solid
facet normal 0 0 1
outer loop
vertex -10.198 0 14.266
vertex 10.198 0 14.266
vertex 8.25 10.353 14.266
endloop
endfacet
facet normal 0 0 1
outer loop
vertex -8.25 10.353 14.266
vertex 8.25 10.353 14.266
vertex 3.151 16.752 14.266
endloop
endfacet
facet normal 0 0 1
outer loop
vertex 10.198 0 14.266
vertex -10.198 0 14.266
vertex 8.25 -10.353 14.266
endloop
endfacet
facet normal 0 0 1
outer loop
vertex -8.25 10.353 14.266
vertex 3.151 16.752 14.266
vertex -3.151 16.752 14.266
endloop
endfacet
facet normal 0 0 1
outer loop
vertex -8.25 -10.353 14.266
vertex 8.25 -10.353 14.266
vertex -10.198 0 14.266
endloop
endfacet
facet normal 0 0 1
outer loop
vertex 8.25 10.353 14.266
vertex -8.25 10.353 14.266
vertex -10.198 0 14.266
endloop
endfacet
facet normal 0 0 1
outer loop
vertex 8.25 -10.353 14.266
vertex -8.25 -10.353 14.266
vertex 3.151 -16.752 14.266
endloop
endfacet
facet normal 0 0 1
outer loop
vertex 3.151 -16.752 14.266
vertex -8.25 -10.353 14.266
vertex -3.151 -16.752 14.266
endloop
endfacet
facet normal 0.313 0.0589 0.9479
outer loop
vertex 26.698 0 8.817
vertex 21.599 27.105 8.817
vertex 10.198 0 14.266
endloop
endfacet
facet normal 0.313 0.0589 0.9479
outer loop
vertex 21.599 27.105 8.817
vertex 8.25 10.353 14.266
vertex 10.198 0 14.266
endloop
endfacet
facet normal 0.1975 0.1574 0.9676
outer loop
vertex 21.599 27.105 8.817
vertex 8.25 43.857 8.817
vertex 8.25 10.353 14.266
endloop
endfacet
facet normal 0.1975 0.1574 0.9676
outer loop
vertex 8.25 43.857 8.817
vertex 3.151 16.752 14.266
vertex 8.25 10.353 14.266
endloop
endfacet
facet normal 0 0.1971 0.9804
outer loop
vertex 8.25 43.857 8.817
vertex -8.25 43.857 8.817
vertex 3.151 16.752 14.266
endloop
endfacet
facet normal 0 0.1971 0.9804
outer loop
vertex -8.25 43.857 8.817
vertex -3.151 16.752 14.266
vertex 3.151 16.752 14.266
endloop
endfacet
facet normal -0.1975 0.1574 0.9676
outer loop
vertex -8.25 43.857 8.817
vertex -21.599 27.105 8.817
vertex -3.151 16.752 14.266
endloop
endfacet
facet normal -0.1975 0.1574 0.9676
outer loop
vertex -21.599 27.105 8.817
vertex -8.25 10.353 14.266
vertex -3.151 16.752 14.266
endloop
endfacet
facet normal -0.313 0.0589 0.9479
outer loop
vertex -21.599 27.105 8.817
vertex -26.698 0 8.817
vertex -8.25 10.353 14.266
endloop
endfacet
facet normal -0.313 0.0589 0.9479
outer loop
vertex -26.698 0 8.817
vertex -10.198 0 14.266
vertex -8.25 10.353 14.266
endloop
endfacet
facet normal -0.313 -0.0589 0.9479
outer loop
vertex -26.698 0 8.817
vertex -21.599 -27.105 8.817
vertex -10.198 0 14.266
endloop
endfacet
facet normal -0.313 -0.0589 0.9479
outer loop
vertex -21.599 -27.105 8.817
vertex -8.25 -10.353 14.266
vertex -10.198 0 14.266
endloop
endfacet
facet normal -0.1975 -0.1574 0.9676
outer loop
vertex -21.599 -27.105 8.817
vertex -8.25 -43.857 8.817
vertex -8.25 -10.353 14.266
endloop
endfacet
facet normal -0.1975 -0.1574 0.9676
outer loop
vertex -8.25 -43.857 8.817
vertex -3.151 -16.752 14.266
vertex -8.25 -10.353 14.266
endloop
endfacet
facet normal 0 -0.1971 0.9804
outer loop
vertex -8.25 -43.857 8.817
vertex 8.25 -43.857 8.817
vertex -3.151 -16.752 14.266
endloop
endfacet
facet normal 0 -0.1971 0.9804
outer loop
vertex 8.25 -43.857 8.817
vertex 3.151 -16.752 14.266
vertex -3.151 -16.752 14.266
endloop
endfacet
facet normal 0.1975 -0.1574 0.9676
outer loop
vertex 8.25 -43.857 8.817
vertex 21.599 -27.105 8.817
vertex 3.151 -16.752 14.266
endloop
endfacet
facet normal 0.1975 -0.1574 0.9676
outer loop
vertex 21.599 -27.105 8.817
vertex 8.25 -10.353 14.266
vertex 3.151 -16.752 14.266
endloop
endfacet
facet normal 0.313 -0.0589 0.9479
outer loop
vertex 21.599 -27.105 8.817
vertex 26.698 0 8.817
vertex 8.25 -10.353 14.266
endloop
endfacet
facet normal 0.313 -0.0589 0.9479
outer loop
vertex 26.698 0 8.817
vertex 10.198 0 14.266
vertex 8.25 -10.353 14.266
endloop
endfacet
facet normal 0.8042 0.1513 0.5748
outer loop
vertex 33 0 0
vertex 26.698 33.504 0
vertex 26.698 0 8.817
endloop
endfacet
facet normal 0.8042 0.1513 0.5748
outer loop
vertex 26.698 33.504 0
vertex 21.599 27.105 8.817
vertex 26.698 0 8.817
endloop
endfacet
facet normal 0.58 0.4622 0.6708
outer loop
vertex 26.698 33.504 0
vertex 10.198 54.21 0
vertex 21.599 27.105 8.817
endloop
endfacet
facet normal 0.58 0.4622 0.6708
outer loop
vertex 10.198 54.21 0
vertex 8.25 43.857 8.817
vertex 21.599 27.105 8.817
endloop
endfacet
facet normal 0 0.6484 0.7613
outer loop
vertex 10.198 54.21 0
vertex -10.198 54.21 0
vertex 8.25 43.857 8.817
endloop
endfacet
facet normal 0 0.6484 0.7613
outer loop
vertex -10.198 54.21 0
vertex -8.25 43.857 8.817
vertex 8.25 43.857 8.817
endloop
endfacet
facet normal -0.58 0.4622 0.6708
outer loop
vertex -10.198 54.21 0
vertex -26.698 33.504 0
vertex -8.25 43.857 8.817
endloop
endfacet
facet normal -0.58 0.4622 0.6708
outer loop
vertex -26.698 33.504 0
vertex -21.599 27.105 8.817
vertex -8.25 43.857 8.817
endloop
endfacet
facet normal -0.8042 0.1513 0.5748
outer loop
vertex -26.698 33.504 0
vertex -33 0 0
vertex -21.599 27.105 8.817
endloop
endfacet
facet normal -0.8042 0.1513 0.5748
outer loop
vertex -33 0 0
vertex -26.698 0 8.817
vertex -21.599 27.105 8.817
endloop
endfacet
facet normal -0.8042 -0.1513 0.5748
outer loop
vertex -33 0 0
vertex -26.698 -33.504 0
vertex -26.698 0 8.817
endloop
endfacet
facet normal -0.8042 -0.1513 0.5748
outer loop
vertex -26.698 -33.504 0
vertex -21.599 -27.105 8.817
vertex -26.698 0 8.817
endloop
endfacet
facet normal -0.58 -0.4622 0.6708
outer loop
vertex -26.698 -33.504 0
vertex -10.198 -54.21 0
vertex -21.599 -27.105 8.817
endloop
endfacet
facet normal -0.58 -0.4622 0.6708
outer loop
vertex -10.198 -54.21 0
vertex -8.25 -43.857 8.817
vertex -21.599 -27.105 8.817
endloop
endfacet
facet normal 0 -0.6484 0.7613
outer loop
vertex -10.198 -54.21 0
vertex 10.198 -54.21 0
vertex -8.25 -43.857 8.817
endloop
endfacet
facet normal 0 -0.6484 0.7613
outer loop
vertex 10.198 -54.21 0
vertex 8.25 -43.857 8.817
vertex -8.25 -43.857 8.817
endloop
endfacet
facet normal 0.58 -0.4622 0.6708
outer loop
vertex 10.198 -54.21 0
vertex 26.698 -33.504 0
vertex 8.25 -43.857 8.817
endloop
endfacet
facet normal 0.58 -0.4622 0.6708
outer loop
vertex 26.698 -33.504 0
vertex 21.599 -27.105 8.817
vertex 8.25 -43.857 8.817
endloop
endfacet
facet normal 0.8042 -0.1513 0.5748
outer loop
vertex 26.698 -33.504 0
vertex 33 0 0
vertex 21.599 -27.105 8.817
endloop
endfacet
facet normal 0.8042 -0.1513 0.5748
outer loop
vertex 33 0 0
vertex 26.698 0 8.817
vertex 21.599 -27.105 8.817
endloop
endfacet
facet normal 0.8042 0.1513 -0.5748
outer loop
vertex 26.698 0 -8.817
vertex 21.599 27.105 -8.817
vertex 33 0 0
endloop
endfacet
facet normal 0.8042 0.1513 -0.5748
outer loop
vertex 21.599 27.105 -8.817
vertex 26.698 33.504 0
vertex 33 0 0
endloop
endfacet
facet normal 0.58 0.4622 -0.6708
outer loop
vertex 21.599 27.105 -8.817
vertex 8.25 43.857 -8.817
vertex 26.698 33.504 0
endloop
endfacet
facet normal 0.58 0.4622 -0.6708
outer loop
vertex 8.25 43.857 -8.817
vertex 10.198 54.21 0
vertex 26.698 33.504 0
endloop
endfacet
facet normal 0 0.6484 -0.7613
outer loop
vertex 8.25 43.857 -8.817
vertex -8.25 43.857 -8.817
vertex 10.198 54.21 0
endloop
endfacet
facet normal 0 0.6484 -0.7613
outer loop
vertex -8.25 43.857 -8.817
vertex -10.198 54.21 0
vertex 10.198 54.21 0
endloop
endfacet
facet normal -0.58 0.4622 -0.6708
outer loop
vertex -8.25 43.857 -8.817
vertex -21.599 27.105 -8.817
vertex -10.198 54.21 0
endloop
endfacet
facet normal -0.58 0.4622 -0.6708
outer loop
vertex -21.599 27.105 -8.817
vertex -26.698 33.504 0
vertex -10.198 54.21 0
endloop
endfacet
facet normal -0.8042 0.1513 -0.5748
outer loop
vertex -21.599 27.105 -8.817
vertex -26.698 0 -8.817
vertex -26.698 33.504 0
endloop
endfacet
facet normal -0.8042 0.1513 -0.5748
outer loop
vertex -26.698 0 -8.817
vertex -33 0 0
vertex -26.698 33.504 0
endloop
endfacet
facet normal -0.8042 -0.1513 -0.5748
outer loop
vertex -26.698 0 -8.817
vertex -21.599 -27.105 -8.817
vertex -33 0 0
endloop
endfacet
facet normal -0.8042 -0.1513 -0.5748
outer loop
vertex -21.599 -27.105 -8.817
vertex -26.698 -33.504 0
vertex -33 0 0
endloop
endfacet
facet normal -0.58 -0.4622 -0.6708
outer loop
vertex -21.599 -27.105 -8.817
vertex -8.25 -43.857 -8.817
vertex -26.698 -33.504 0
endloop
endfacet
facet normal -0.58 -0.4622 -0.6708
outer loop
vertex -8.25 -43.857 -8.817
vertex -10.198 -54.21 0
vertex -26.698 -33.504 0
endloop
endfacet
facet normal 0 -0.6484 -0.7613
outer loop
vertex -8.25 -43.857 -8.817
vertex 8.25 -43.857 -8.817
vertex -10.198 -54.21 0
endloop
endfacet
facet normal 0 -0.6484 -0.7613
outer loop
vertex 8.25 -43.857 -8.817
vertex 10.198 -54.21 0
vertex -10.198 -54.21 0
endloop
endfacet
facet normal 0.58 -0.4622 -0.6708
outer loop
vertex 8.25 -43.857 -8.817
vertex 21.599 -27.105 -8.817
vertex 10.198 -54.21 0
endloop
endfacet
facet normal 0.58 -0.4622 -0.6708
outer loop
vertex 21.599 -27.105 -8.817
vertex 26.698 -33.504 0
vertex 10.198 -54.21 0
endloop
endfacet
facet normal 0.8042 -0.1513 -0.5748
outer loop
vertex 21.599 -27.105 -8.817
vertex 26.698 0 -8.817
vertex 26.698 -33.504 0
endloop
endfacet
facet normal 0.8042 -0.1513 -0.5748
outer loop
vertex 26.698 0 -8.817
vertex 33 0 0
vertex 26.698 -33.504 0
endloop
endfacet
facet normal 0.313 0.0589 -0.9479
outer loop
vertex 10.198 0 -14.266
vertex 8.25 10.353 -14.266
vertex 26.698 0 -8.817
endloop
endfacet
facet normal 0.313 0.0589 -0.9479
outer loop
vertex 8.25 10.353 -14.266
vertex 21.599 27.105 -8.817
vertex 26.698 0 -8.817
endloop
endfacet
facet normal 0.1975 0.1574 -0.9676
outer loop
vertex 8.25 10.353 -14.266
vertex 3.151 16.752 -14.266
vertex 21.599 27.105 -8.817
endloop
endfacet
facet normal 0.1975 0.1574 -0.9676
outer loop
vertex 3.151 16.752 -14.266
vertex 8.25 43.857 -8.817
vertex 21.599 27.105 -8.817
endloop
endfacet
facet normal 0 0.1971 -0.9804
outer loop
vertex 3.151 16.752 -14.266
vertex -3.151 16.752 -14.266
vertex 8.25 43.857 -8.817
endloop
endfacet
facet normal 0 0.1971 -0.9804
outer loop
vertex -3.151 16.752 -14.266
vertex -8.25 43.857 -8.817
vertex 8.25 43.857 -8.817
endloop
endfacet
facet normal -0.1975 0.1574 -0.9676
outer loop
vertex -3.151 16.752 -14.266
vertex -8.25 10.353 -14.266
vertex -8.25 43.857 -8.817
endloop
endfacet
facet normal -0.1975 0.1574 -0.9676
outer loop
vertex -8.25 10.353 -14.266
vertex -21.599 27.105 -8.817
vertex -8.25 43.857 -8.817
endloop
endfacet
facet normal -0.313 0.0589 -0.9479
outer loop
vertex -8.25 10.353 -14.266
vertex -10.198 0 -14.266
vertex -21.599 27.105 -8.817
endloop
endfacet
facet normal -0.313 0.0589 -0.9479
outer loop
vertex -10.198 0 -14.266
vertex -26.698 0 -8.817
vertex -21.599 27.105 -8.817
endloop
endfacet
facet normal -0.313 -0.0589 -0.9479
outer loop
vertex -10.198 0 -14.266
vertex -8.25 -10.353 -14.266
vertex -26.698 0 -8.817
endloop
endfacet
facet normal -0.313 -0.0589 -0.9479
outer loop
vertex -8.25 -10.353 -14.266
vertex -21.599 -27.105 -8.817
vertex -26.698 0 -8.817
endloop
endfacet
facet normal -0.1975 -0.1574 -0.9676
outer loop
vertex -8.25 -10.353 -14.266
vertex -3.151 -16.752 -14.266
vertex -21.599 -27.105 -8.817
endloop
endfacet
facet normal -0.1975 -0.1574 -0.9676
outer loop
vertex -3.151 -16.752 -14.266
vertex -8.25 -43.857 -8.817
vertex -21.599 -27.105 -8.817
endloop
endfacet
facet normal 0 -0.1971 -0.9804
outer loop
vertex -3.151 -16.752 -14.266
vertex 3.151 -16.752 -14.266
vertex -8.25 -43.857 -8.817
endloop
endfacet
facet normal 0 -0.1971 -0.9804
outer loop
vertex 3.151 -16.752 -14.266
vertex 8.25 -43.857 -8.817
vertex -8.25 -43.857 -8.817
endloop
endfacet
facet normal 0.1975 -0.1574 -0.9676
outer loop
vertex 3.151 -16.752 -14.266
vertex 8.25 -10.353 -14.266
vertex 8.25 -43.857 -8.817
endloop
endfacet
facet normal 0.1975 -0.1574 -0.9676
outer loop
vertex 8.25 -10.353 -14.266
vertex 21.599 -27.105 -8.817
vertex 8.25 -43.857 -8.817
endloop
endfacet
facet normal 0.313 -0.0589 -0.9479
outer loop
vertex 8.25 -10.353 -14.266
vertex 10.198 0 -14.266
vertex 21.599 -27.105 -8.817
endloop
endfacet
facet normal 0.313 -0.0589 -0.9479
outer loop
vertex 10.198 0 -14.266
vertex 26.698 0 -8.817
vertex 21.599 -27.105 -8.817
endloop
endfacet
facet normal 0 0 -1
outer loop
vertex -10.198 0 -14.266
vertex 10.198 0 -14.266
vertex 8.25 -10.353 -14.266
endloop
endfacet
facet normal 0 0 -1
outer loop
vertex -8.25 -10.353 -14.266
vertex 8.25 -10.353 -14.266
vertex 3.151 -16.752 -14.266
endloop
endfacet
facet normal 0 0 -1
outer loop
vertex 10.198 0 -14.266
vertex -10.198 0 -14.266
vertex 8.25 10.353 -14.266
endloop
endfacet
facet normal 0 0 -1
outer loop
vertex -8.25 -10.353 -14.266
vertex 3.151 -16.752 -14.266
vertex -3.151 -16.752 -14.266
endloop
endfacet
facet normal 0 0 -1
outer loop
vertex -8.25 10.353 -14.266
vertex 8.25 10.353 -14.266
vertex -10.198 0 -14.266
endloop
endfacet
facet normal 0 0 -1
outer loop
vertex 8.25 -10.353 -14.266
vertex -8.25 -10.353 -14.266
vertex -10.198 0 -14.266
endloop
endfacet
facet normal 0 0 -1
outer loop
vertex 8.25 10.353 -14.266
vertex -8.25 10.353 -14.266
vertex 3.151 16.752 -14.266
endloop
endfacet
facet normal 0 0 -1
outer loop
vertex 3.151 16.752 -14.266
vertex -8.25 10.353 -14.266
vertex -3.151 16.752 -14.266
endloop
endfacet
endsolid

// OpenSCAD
// Generated by SolidPython 1.0.1 on 2020-07-29 00:46:50


scale(v = [11, 19, 5]) {
	sphere(r = 3);
}
/***********************************************
*********      SolidPython code:      **********
************************************************
 
# import packages: SolidPython
from solid import *
from solid.utils import *
from itertools import chain, combinations, permutations


class Resize:

    def __init__(self, scad_file):
        self.scad_file = scad_file
        #self.scad_file = import_scad(scad_file)
        # cone/cylinder param:
        self.r1 = 0
        self.r2 = 0
        self.h = 0
        # rectangular prism param:
        self.w = 0
        self.l = 0
        # ellipse param:
        self.r = 0

    # import OpenScad code (file name corresponds to shape)


    # classify shape + parameters
    def assign(self, param1, param2, param3):
        if self.scad_file == 'cone.scad':
            self.r1 = param1
            self.r2 = param2
            self.h = param3
        elif self.scad_file == 'cylinder.scad':
            self.r1 = param1
            self.r2 = param2
            self.h = param3
        elif self.scad_file == 'rectangularPrism.scad':
            self.h = param1
            self.l = param2
            self.w = param3
        else:
            self.r = param1
            self.h = param2

    # resize parameters
    def iterate(self):
        x = range(3, 20, 2)
        i = 1
        if self.scad_file == 'cone.scad':
            tempList = list(permutations(x, 2))
            for temp in tempList:
                param1 = temp[0]
                param2 = temp[1]
                filepath = 'produced_scad_files/' + 'cone' + str(param1) + '_' + str(param2) + '_' + '.scad'
                scad_render_to_file(cylinder(h=param1, r1=param2, r2=0), filepath)

        elif self.scad_file == 'cylinder.scad':
            tempList = list(permutations(x, 3))
            for temp in tempList:
                param1 = temp[0]
                param2 = temp[1]
                filepath = 'produced_scad_files/' + 'cylinder' + str(param1) + '_' + str(param2) + '_' + '.scad'
                scad_render_to_file(cylinder(h=param1, r1=param2, r2=param2), filepath)

        elif self.scad_file == 'rectangularPrism.scad':
            tempList = list(permutations(x, 3))
            for temp in tempList:
                param1 = temp[0]
                param2 = temp[1]
                param3 = temp[2]
                filepath = 'produced_scad_files/' + 'rectangularPrism' + str(param1) + '_' + str(param2) + '_' + str(
                    param3) + '.scad'
                scad_render_to_file(cube(size=(param1, param2, param3)), filepath)

        elif self.scad_file == 'ellipse.scad':
            tempList = list(permutations(x, 4))
            for temp in tempList:
                param1 = temp[0]
                param2 = temp[1]
                param3 = temp[2]
                param4 = temp[3]
                filepath = 'produced_scad_files/' + 'ellipse' + str(param1) + '_' + str(param2) + '_' + str(param3) + '_' + str(param4) + '.scad'
                scad_render_to_file(scale([param1, param2, param3])(sphere(r=param4)), filepath)

    def render_to_scadfile(self):
        scad_render_to_file(scad, 'example.scad') 
 
************************************************/
